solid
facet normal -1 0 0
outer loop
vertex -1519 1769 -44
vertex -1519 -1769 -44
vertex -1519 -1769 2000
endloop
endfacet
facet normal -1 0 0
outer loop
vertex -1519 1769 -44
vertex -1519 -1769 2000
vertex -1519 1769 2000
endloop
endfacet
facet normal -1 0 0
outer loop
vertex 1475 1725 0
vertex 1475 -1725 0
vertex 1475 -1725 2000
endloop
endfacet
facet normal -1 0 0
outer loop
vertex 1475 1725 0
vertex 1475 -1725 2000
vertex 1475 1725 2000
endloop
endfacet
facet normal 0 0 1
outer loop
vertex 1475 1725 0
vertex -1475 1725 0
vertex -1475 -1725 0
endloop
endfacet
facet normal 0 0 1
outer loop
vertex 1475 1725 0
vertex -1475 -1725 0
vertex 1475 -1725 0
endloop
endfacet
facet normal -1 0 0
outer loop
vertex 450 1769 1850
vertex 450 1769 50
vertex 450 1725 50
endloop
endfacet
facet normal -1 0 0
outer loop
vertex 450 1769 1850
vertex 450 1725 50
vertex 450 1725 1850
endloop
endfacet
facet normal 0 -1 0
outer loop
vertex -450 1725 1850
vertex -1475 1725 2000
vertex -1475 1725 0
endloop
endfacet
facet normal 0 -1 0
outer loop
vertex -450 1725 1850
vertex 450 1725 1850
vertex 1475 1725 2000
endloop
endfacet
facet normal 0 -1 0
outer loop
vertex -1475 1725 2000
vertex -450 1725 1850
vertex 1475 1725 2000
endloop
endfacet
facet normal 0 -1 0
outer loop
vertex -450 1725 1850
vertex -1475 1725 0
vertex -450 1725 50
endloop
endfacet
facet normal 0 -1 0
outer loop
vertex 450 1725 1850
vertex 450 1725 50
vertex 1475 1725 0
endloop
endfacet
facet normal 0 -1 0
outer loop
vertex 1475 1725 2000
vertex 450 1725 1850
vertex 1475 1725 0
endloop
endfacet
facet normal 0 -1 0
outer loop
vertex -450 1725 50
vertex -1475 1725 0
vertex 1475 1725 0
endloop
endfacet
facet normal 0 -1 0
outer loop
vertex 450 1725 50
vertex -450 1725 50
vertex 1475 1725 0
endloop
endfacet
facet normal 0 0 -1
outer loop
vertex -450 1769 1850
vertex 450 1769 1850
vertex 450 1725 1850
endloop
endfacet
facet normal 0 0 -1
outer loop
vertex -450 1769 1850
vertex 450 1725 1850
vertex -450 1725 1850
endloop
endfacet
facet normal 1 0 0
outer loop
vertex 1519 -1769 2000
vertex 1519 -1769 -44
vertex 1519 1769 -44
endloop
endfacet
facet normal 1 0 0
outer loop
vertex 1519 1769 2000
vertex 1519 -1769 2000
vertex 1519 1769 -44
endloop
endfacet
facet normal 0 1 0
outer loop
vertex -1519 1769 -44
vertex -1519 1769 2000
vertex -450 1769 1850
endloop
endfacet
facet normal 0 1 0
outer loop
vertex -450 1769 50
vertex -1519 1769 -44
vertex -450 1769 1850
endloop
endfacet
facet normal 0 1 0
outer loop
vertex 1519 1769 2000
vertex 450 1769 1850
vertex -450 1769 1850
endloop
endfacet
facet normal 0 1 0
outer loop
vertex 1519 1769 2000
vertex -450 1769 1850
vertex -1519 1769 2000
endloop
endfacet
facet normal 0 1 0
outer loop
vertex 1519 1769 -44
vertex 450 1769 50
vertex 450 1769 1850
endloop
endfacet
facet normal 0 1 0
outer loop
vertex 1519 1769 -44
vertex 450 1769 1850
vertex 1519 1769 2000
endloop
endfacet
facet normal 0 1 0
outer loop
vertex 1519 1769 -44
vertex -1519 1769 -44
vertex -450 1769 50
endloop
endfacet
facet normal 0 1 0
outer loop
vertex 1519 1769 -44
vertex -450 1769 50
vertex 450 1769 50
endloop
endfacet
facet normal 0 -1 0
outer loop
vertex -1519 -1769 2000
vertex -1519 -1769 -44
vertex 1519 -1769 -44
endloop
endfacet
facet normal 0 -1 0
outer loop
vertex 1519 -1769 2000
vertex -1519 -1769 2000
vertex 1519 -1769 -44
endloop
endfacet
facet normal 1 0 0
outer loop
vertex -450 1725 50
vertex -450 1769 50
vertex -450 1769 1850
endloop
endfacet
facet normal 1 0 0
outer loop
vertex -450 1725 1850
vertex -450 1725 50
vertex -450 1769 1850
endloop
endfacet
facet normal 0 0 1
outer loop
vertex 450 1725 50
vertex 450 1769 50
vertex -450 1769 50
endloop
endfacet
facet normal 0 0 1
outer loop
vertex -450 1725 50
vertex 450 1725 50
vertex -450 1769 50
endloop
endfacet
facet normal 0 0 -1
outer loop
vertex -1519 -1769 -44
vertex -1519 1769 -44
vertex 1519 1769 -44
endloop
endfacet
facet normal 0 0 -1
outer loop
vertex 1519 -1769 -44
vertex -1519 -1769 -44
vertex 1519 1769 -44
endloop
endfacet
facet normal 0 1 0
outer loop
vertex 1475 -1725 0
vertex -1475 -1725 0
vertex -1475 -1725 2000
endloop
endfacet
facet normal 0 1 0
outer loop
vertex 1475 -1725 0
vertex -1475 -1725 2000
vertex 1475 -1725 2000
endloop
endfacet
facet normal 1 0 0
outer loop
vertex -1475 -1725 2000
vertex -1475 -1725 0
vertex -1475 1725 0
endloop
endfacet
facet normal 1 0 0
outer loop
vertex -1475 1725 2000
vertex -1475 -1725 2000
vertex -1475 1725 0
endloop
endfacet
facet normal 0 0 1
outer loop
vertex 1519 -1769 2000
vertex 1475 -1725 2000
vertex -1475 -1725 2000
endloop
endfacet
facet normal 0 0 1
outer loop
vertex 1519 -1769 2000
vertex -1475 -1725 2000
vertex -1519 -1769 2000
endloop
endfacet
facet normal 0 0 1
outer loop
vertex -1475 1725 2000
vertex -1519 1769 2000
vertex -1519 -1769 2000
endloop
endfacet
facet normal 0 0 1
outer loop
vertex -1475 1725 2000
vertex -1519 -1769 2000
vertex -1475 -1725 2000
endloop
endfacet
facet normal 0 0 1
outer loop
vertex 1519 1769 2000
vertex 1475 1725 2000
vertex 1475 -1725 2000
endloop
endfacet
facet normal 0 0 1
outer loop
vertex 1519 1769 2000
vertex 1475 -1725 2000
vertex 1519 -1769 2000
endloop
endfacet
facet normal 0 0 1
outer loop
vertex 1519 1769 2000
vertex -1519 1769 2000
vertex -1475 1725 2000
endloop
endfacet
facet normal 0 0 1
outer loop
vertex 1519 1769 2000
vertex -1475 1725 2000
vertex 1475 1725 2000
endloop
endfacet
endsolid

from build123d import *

# Parameters (mm, degrees)
F0_W     = 2950
F0_H     = 3450
F1_DEPTH = 2000
F2_T     = 44
F3_W     = 900
F3_H     = 1800
F4_DEPTH = 44


with BuildPart() as f1:
    # F0 (on Top) → F1 (new body)
    with BuildSketch(Plane.XY):
        Rectangle(F0_W, F0_H)
    extrude(amount=F1_DEPTH)

    # F2
    f2_openings = [f1.faces().sort_by_distance(p)[0] for p in [
        (0, 0, 2000),
    ]]
    offset(amount=F2_T, openings=f2_openings, kind=Kind.INTERSECTION)

    # F3 (on face) → F4 (cut, through all)
    with BuildSketch(Plane(origin=(0, 1769, 0), x_dir=(-1, 0, 0), z_dir=(0, 1, 0))):
        with Locations((0, 950)):
            Rectangle(F3_W, F3_H)
    extrude(amount=-F4_DEPTH, mode=Mode.SUBTRACT)


solid = f1.part
